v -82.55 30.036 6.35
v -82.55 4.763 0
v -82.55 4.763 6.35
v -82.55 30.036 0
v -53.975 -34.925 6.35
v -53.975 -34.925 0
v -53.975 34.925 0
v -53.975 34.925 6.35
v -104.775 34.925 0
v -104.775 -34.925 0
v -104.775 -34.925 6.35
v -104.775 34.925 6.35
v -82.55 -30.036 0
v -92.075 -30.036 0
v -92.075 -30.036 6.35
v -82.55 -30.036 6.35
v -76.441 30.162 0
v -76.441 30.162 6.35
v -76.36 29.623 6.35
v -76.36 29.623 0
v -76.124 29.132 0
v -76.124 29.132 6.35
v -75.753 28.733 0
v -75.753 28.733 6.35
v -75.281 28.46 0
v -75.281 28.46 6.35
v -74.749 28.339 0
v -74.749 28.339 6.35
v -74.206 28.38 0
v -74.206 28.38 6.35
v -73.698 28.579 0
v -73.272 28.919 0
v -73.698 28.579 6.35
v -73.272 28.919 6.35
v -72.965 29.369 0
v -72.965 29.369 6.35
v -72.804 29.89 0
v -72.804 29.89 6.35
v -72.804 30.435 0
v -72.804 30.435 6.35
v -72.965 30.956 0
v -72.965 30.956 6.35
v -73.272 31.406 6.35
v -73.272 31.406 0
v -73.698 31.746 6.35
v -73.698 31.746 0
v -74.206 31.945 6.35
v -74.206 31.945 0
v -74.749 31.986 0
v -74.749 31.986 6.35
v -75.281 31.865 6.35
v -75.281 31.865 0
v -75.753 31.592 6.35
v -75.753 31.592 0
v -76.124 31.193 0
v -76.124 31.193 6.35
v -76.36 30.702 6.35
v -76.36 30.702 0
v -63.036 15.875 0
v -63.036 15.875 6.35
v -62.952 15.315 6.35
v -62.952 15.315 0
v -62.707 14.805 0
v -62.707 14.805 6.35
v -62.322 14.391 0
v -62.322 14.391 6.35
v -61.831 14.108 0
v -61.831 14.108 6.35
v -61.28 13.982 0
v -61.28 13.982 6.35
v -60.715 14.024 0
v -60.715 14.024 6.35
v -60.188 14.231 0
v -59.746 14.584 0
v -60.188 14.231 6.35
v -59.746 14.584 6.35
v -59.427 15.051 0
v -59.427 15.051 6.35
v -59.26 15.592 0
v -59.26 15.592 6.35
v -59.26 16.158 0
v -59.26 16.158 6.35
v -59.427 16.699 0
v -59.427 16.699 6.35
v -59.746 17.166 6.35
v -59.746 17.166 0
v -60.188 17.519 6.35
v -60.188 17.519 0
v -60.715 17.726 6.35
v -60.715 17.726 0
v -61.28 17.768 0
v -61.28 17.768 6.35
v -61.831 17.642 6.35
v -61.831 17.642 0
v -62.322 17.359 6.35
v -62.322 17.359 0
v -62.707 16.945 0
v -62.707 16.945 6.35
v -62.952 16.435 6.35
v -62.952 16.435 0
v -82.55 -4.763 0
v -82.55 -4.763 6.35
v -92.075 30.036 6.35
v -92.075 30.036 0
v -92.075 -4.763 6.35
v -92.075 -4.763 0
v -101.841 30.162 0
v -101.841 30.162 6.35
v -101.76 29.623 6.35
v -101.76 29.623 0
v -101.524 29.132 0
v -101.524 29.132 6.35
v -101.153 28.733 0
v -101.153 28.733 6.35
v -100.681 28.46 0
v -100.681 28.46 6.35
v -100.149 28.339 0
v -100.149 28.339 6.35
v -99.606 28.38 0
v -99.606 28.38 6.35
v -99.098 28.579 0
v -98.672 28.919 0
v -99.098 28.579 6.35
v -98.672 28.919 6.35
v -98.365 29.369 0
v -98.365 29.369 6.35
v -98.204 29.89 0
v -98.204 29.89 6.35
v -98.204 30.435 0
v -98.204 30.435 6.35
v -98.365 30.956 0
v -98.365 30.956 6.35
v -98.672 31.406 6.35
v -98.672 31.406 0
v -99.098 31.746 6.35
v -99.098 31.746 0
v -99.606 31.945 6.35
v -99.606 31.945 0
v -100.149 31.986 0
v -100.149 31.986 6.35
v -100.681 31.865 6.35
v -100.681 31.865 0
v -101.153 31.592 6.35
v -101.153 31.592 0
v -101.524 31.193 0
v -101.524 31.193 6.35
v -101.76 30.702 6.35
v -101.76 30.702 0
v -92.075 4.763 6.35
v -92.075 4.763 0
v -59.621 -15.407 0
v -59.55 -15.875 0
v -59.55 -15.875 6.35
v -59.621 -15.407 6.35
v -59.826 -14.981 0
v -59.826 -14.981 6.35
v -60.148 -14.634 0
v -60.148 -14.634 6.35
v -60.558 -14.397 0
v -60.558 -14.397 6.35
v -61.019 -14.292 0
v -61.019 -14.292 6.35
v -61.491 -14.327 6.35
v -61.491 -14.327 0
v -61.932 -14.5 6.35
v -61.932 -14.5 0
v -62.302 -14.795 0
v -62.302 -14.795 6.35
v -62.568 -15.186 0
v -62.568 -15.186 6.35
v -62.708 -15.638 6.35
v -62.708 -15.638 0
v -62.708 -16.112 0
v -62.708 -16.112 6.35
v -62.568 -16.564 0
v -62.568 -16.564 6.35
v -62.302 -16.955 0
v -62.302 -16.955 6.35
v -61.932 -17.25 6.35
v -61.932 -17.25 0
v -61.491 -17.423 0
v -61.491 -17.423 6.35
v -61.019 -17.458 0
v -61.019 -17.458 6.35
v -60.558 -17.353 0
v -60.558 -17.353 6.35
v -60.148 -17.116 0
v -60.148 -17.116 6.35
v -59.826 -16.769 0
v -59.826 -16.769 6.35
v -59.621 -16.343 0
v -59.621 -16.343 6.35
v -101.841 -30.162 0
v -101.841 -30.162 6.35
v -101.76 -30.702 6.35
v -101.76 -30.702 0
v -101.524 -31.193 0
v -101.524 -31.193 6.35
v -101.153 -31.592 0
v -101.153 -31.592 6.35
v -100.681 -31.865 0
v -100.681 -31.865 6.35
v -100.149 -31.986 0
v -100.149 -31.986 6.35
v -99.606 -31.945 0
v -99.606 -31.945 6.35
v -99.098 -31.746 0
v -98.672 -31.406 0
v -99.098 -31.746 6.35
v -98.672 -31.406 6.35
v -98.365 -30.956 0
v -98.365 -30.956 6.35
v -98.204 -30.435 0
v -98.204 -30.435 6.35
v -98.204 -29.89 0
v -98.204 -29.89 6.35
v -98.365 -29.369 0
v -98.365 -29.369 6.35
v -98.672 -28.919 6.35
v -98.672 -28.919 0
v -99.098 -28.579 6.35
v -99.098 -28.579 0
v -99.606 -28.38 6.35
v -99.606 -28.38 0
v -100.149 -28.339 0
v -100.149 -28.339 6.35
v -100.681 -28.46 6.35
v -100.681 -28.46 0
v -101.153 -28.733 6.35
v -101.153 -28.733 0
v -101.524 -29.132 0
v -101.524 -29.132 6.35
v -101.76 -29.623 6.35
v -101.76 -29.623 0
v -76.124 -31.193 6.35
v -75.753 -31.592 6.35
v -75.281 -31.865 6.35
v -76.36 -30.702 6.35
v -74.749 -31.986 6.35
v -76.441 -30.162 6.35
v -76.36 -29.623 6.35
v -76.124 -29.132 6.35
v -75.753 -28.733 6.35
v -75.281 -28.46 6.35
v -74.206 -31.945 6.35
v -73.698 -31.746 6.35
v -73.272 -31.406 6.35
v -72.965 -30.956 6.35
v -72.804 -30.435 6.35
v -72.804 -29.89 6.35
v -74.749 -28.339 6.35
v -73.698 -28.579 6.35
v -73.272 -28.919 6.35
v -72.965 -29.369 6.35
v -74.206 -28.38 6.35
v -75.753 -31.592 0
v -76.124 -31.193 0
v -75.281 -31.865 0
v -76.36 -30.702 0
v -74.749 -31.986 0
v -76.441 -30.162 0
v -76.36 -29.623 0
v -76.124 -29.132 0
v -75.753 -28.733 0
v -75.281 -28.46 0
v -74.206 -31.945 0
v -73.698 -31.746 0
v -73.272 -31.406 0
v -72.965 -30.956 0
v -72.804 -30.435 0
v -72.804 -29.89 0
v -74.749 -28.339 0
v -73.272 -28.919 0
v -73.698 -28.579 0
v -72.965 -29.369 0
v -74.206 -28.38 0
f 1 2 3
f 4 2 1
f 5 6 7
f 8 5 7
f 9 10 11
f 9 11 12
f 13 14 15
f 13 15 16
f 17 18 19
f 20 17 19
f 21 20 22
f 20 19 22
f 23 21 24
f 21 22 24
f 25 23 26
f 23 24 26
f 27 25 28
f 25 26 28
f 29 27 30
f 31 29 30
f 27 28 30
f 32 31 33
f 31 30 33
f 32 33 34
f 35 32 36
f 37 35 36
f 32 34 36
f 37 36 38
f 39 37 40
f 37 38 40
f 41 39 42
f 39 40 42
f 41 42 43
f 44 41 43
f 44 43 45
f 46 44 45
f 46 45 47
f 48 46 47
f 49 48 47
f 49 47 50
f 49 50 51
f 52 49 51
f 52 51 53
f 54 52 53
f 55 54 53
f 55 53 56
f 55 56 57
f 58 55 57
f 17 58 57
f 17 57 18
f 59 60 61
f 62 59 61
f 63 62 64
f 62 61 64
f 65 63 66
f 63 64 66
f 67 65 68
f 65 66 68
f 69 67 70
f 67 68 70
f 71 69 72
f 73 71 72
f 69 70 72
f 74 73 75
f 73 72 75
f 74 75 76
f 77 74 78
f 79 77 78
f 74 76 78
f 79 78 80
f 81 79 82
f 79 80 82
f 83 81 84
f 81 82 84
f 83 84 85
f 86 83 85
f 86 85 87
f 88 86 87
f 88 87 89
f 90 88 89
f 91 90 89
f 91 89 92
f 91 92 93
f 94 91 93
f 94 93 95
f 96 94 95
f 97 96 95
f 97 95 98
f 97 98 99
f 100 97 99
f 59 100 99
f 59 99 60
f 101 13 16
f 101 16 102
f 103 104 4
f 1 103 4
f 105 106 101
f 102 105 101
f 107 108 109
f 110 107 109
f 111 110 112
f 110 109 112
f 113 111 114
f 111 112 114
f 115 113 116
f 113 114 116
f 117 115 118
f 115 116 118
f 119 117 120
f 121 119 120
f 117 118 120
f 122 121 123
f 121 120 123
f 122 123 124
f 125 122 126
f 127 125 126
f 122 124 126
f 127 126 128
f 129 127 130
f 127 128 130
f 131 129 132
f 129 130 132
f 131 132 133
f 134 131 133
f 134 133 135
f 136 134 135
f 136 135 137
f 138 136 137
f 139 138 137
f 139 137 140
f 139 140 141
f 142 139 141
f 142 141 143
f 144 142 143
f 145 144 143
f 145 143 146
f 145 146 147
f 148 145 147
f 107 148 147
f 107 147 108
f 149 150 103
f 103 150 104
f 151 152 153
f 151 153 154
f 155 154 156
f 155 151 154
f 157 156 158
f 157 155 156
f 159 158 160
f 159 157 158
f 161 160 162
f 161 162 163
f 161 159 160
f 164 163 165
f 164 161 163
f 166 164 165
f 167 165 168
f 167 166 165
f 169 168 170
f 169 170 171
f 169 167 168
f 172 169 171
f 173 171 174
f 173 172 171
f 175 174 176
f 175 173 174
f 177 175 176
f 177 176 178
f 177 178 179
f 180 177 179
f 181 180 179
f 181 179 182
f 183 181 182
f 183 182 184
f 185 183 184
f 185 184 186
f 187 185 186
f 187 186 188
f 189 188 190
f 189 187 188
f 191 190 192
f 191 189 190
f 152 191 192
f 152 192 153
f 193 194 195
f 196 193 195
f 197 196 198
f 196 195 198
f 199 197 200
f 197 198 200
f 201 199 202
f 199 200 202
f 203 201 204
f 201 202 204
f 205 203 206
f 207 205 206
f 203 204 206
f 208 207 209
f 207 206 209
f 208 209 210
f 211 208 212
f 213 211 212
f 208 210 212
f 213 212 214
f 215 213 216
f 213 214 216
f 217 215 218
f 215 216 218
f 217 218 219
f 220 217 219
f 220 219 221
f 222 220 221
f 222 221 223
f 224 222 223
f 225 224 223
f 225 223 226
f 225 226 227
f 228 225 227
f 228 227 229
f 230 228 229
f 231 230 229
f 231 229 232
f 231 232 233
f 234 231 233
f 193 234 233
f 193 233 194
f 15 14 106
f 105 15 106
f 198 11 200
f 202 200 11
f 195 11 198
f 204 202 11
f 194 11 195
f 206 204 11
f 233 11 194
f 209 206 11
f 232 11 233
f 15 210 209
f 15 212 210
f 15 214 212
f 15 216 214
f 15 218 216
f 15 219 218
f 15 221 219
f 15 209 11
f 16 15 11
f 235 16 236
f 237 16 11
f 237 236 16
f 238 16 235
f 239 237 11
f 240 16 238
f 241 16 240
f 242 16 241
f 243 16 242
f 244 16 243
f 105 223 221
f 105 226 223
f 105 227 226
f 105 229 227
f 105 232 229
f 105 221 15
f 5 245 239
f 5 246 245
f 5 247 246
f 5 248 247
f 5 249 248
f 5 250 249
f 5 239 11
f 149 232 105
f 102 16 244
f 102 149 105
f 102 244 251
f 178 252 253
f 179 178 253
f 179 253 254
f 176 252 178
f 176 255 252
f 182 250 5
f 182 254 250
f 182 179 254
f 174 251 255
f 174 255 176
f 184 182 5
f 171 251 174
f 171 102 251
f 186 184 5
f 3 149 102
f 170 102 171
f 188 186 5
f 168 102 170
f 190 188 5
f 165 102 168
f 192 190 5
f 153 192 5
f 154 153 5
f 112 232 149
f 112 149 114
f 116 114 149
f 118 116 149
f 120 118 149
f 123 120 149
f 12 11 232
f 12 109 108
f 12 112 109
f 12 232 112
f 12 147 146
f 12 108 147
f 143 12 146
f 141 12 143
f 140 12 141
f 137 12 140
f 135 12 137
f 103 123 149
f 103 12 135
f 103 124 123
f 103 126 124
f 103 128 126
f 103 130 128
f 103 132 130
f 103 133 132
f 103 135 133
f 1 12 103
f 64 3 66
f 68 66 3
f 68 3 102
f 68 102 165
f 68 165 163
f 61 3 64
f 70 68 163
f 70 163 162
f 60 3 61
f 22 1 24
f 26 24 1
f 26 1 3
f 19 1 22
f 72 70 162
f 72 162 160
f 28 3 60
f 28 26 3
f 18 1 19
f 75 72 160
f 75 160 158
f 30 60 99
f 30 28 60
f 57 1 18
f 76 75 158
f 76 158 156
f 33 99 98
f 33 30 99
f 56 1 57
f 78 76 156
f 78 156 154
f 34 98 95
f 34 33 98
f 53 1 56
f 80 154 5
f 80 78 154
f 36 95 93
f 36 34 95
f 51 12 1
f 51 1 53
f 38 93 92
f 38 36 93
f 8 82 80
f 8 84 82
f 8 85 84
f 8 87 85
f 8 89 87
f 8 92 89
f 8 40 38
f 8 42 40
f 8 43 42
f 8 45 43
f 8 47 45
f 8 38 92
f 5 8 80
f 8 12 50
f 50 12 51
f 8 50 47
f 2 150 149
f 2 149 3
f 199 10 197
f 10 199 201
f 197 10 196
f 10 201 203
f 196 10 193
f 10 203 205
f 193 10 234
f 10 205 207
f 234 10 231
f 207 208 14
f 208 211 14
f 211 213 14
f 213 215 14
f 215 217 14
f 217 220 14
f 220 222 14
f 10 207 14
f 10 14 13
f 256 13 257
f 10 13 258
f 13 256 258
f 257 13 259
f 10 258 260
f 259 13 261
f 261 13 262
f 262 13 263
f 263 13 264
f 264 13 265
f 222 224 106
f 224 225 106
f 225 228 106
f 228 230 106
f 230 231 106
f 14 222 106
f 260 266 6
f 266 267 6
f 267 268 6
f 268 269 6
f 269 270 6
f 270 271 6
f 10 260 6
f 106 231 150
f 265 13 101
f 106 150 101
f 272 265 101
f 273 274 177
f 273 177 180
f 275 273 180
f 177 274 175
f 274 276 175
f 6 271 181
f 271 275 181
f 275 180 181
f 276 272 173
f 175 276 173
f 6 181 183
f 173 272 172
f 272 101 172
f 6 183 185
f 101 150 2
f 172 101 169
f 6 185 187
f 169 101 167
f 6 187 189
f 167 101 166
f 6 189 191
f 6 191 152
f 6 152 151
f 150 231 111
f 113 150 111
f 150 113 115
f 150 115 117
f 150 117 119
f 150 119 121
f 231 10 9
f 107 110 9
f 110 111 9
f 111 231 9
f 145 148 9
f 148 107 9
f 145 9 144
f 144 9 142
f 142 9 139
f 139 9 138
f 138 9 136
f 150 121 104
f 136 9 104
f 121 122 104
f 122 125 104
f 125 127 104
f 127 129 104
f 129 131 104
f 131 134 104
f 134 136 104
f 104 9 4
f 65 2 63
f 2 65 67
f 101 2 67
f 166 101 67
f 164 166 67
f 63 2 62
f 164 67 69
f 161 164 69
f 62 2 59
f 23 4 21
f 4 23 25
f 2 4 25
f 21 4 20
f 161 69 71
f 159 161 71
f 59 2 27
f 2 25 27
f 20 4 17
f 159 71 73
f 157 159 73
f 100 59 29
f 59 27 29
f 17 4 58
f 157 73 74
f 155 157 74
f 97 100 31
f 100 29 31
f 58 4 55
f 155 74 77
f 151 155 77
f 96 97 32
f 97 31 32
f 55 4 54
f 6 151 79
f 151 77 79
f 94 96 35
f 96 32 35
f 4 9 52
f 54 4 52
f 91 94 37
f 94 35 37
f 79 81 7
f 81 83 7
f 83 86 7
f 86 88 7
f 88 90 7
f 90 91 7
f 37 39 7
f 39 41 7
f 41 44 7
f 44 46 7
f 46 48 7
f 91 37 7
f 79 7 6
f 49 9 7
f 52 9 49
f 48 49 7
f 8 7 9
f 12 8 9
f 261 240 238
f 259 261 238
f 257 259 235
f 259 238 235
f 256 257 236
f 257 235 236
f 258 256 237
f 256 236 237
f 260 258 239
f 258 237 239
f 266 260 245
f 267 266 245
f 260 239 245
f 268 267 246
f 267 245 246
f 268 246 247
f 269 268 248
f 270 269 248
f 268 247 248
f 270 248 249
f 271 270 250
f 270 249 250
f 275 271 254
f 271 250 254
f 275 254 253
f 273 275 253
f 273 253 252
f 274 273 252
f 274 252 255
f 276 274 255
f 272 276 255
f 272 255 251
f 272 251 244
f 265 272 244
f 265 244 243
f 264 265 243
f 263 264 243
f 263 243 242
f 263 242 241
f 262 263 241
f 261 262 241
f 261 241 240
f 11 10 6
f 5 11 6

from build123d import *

# Parameters (mm, degrees)
F0_W     = 34.925
F0_H     = 69.85
F0_R     = 1.8288
F0_W_2   = 9.525
F0_H_2   = 25.273
F0_W_3   = 15.875
F0_R_2   = 1.5875
F1_DEPTH = 6.35
F2_D     = 3.6576
F3_D     = 3.7973


# Not quite as in the source:
# - a feature names something its author has since deleted; it is built from what else it names


with BuildPart() as f1:
    # F0 (on Top) → F1 (new body)
    with BuildSketch(Plane.XY):
        with Locations((-87.3125, 0)):
            Rectangle(F0_W, F0_H)
        with Locations((-100.0125, -30.1625)):
            Circle(F0_R, mode=Mode.SUBTRACT)
        with Locations((-87.3125, -17.399)):
            Rectangle(F0_W_2, F0_H_2, mode=Mode.SUBTRACT)
        with Locations((-74.6125, -30.1625)):
            Circle(F0_R, mode=Mode.SUBTRACT)
        with Locations((-87.3125, 17.399)):
            Rectangle(F0_W_2, F0_H_2, mode=Mode.SUBTRACT)
        with Locations((-100.0125, 30.1625)):
            Circle(F0_R, mode=Mode.SUBTRACT)
        with Locations((-74.6125, 30.1625)):
            Circle(F0_R, mode=Mode.SUBTRACT)
        with Locations((-61.9125, 0)):
            Rectangle(F0_W_3, F0_H)
        with Locations((-61.1378, -15.875)):
            Circle(F0_R_2, mode=Mode.SUBTRACT)
        with Locations((-61.1378, 15.875)):
            Circle(F0_R_2, mode=Mode.SUBTRACT)
        with Locations((-100.0125, -30.1625)):
            Circle(F0_R)
        with Locations((-100.0125, 30.1625)):
            Circle(F0_R)
        with Locations((-74.6125, 30.1625)):
            Circle(F0_R)
        with Locations((-74.6125, -30.1625)):
            Circle(F0_R)
        with Locations((-61.1378, 15.875)):
            Circle(F0_R_2)
    extrude(amount=F1_DEPTH)

    # F2 (through all)
    with Locations(Plane(origin=(0, 0, 0), x_dir=(1, 0, 0), z_dir=(0, 0, -1))):
        with Locations((-100.0125, -30.1625), (-74.6125, -30.1625), (-74.6125, 30.1625), (-100.0125, 30.1625)):
            Hole(F2_D / 2)

    # F3 (through all)
    with Locations(Plane(origin=(0, 0, 0), x_dir=(1, 0, 0), z_dir=(0, 0, -1))):
        with Locations((-61.1378, -15.875)):
            Hole(F3_D / 2)


solid = f1.part
